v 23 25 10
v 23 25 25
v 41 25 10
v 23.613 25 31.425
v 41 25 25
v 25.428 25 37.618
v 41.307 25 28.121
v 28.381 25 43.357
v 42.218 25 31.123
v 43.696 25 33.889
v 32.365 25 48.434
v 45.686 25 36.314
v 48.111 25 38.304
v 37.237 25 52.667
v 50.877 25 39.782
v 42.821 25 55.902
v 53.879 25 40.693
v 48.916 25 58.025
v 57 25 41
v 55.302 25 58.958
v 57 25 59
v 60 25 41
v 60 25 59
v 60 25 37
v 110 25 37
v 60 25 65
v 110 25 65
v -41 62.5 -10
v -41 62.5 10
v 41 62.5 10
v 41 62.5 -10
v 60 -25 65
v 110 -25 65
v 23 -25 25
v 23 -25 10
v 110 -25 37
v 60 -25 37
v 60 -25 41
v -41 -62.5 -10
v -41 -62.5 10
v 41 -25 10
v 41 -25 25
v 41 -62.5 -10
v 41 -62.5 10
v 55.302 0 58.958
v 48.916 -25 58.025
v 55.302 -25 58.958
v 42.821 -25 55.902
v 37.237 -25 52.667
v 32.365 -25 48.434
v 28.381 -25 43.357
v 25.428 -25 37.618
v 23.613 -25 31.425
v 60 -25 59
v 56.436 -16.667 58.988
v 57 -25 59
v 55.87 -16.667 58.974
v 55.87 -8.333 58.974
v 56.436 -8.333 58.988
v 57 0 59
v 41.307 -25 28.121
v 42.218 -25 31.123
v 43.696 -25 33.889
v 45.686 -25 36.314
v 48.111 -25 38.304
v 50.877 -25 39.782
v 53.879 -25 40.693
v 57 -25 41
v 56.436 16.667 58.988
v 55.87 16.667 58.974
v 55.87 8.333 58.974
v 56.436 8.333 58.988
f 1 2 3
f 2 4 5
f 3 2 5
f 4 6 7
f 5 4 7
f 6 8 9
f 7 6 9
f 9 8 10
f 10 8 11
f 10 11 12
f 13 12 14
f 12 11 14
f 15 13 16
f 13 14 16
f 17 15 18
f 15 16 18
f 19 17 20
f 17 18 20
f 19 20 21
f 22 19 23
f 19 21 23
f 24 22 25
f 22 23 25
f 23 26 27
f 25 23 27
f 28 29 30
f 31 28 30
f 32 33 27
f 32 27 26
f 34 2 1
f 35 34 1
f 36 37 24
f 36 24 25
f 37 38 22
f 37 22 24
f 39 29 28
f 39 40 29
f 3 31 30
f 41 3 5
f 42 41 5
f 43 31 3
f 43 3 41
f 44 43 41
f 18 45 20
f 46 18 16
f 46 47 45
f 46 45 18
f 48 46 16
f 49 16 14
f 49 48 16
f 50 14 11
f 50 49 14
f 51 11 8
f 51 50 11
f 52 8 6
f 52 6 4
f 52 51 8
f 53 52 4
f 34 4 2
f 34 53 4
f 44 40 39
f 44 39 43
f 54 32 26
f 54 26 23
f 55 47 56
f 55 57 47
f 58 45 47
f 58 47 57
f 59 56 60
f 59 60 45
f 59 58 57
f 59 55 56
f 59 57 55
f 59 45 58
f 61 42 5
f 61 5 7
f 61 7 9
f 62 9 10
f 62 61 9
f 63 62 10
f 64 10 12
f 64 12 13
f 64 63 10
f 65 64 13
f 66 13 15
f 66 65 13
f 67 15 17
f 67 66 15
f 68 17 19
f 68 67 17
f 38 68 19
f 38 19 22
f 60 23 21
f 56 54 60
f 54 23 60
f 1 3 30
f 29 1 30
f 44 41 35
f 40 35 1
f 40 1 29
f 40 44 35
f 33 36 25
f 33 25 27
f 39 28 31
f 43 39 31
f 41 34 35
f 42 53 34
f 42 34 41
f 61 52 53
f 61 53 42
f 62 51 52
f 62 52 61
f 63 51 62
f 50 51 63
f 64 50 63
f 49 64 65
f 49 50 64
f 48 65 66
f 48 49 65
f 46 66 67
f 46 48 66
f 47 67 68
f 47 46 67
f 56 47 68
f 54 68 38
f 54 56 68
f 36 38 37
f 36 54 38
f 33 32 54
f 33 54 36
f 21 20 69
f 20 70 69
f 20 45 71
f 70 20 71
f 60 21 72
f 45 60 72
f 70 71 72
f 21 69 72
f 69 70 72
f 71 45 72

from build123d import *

# Parameters (mm, degrees)
F1_DEPTH = 62.5
F0_W     = 21.2285545291
F0_H     = 18
F2_DEPTH = 25


with BuildPart() as f1:
    # F0 (on Front) → F1 (new body, symmetric)
    with BuildSketch(Plane.XZ):
        Polygon((-41, 10), (-41, -10), (41, -10), (41, 10), (23, 10), align=None)
    extrude(amount=F1_DEPTH, both=True)

    # F0 (on Front) → F2 (join, symmetric)
    with BuildSketch(Plane.XZ):
        with BuildLine():
            Line((23, 10), (41, 10))
            Line((41, 10), (41, 25))
            ThreePointArc((41, 25), (45.686291501, 36.313708499), (57, 41))
            Line((57, 41), (60, 41))
            Line((60, 41), (60, 59))
            Line((60, 59), (57, 59))
            add(Edge.make_bspline(
                [(55.3022101566, 58.9575839784), (55.8715194046, 58.9754471326), (56.4375192282, 58.9895954178), (57, 59)],
                knots=[108.0329717794, 108.0329717794, 108.0329717794, 108.0329717794, 109.5673308975, 109.5673308975, 109.5673308975, 109.5673308975], degree=3))
            ThreePointArc((55.3022101566, 58.9575839784), (32.3654221198, 48.4336845729), (23, 25))
            Line((23, 25), (23, 10))
        make_face()
        with Locations((70.6142772645, 50)):
            Rectangle(F0_W, F0_H)
        Polygon((60, 65), (60, 59), (81.2285545291, 59), (81.2285545291, 41), (60, 41), (60, 37), (110, 37), (110, 65), align=None)
    extrude(amount=F2_DEPTH, both=True)


solid = f1.part
